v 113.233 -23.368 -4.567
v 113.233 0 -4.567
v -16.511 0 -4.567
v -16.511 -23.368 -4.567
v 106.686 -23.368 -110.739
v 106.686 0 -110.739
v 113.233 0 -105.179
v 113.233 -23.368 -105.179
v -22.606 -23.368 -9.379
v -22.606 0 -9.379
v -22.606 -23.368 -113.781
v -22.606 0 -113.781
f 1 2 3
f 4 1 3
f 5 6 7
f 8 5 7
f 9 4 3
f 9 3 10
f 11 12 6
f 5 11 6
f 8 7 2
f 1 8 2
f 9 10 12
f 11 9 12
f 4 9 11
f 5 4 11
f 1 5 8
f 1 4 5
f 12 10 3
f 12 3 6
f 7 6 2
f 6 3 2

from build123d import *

# Parameters (mm, degrees)
F0_W     = 123.1974195689
F0_H     = 95.799991861
F1_DEPTH = 23.368


with BuildPart() as f1:
    # F0 (on Front) → F1 (new body)
    with BuildSketch(Plane.XZ):
        Polygon((113.2330745459, -4.5672673732), (106.6863015294, -9.379176423), (106.6863015294, -105.1791682839), (113.2330745459, -105.1791682839), align=None)
        Polygon((-16.5111180395, -9.379176423), (106.6863015294, -9.379176423), (113.2330745459, -4.5672673732), (-16.5111180395, -4.5672673732), align=None)
        Polygon((-16.5111180395, -105.1791682839), (-16.5111180395, -9.379176423), (-22.6063877344, -9.379176423), (-22.6063877344, -101.0192483664), (-22.6063877344, -113.7807220221), align=None)
        Polygon((-22.6063877344, -9.379176423), (-16.5111180395, -9.379176423), (-16.5111180395, -4.5672673732), align=None)
        Polygon((113.2330745459, -105.1791682839), (106.6863015294, -105.1791682839), (106.6863015294, -110.7390969992), align=None)
        Polygon((106.6863015294, -110.7390969992), (106.6863015294, -105.1791682839), (-16.5111180395, -105.1791682839), (-22.6063877344, -113.7807220221), align=None)
        with Locations((45.087591745, -57.2791723534)):
            Rectangle(F0_W, F0_H)
    extrude(amount=F1_DEPTH)


solid = f1.part
